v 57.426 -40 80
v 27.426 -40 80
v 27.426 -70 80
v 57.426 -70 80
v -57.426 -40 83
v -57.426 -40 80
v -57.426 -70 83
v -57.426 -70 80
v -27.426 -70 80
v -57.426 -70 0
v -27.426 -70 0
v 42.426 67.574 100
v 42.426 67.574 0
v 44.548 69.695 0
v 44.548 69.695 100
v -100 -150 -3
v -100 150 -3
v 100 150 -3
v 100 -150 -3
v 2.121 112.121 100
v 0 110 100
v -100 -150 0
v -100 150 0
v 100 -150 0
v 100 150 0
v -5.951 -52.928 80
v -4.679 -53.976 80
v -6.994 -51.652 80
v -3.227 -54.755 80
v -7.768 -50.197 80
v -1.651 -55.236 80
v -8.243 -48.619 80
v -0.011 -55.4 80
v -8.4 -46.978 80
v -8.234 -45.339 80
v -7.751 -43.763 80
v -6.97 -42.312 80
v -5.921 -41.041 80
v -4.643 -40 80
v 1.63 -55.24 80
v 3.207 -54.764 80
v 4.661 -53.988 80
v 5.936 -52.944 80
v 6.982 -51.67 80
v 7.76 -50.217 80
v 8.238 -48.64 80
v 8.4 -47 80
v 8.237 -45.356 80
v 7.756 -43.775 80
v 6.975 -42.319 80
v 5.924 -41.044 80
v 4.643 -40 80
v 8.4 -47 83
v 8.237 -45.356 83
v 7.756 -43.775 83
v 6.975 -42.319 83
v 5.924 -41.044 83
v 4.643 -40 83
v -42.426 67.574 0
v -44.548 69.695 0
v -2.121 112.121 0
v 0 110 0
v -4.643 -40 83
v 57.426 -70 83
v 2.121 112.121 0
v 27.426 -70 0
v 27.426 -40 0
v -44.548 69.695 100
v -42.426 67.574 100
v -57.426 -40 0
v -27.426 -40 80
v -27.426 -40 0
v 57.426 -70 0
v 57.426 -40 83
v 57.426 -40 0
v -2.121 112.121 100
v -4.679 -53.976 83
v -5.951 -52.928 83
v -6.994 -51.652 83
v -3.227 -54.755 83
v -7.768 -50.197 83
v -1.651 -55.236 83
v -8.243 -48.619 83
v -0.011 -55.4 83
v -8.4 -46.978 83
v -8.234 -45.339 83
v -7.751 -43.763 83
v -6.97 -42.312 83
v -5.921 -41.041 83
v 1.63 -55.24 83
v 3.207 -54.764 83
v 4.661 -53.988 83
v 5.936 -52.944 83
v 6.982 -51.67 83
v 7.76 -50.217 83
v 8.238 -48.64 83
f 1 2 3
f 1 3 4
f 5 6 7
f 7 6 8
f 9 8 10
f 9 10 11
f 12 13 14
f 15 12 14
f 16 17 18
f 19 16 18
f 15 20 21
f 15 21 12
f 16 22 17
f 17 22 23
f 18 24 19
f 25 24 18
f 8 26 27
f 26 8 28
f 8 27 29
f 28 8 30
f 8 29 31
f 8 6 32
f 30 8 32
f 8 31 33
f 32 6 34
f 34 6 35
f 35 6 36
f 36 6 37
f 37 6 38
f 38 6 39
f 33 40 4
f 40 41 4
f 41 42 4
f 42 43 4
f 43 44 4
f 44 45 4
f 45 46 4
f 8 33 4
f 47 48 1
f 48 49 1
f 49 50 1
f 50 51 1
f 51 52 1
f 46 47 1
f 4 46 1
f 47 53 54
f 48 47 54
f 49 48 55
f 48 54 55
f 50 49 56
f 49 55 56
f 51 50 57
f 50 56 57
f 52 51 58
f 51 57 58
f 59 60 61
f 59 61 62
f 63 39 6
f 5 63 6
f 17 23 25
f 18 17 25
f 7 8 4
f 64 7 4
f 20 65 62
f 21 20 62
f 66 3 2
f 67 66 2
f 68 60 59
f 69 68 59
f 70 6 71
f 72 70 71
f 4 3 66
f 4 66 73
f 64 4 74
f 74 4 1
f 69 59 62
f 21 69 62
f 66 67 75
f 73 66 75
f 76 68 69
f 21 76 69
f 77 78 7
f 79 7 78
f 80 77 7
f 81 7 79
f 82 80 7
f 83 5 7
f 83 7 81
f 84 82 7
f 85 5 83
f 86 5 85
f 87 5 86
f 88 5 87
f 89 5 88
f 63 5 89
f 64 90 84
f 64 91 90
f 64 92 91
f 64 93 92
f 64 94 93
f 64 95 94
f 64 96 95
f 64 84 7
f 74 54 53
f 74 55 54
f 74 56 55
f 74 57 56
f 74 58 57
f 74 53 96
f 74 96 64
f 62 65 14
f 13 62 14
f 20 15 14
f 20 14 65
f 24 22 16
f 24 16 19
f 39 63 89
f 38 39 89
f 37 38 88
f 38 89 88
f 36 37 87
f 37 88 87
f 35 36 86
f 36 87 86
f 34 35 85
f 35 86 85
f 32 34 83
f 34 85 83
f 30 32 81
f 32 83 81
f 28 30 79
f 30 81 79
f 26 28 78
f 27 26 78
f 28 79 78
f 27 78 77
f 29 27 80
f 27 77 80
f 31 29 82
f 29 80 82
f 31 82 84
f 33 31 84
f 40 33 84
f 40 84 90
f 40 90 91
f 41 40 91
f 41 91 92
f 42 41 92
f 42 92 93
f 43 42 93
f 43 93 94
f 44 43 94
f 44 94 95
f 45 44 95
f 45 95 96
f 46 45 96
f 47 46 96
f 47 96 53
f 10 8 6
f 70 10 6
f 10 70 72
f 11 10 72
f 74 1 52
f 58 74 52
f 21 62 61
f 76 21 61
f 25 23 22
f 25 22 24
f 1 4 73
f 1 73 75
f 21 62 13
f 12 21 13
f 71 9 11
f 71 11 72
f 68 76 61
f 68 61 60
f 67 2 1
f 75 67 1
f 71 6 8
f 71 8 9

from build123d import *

# Parameters (mm, degrees)
F1_W     = 200
F1_H     = 300
F2_DEPTH = 3
F0_W     = 30
F0_H     = 30
F3_DEPTH = 80
F4_DEPTH = 100
F6_DEPTH = 3
F8_DEPTH = 25


with BuildPart() as f2:
    # F1 (on Top) → F2 (new body)
    with BuildSketch(Plane.XY):
        Rectangle(F1_W, F1_H)
    extrude(amount=-F2_DEPTH)


with BuildPart() as f3:
    # F0 (on Top) → F3 (new body)
    with BuildSketch(Plane.XY):
        with Locations((-42.426407, -55)):
            Rectangle(F0_W, F0_H)
        with Locations((42.426407, -55)):
            Rectangle(F0_W, F0_H)
    extrude(amount=F3_DEPTH)


with BuildPart() as f4:
    # F0 (on Top) → F4 (new body)
    with BuildSketch(Plane.XY):
        Polygon((-42.426407, 67.573593), (0, 110), (-2.12132, 112.12132), (-44.547727, 69.694913), align=None)
        Polygon((2.12132, 112.12132), (0, 110), (42.426407, 67.573593), (44.547727, 69.694913), align=None)
    extrude(amount=F4_DEPTH)


with BuildPart() as f6:
    # F5 (on face) → F6 (new body)
    with BuildSketch(Plane.XY.offset(80)):
        Polygon((-57.426407, -40), (-57.426407, -70), (-27.426407, -70), (27.426407, -70), (57.426407, -70), (57.426407, -40), (27.426407, -40), (-27.426407, -40), align=None)
    extrude(amount=F6_DEPTH)

    # F7 (on face) → F8 (cut)
    with BuildSketch(Plane.XY.offset(83)):
        with BuildLine():
            ThreePointArc((-4.643275, -40), (-3.972184, -54.40147), (8.4, -47))
            ThreePointArc((8.4, -47), (7.40147, -43.027816), (4.643275, -40))
            Line((4.643275, -40), (-4.643275, -40))
        make_face()
    extrude(amount=-F8_DEPTH, mode=Mode.SUBTRACT)


solid = Compound([f2.part, f3.part, f4.part, f6.part])
